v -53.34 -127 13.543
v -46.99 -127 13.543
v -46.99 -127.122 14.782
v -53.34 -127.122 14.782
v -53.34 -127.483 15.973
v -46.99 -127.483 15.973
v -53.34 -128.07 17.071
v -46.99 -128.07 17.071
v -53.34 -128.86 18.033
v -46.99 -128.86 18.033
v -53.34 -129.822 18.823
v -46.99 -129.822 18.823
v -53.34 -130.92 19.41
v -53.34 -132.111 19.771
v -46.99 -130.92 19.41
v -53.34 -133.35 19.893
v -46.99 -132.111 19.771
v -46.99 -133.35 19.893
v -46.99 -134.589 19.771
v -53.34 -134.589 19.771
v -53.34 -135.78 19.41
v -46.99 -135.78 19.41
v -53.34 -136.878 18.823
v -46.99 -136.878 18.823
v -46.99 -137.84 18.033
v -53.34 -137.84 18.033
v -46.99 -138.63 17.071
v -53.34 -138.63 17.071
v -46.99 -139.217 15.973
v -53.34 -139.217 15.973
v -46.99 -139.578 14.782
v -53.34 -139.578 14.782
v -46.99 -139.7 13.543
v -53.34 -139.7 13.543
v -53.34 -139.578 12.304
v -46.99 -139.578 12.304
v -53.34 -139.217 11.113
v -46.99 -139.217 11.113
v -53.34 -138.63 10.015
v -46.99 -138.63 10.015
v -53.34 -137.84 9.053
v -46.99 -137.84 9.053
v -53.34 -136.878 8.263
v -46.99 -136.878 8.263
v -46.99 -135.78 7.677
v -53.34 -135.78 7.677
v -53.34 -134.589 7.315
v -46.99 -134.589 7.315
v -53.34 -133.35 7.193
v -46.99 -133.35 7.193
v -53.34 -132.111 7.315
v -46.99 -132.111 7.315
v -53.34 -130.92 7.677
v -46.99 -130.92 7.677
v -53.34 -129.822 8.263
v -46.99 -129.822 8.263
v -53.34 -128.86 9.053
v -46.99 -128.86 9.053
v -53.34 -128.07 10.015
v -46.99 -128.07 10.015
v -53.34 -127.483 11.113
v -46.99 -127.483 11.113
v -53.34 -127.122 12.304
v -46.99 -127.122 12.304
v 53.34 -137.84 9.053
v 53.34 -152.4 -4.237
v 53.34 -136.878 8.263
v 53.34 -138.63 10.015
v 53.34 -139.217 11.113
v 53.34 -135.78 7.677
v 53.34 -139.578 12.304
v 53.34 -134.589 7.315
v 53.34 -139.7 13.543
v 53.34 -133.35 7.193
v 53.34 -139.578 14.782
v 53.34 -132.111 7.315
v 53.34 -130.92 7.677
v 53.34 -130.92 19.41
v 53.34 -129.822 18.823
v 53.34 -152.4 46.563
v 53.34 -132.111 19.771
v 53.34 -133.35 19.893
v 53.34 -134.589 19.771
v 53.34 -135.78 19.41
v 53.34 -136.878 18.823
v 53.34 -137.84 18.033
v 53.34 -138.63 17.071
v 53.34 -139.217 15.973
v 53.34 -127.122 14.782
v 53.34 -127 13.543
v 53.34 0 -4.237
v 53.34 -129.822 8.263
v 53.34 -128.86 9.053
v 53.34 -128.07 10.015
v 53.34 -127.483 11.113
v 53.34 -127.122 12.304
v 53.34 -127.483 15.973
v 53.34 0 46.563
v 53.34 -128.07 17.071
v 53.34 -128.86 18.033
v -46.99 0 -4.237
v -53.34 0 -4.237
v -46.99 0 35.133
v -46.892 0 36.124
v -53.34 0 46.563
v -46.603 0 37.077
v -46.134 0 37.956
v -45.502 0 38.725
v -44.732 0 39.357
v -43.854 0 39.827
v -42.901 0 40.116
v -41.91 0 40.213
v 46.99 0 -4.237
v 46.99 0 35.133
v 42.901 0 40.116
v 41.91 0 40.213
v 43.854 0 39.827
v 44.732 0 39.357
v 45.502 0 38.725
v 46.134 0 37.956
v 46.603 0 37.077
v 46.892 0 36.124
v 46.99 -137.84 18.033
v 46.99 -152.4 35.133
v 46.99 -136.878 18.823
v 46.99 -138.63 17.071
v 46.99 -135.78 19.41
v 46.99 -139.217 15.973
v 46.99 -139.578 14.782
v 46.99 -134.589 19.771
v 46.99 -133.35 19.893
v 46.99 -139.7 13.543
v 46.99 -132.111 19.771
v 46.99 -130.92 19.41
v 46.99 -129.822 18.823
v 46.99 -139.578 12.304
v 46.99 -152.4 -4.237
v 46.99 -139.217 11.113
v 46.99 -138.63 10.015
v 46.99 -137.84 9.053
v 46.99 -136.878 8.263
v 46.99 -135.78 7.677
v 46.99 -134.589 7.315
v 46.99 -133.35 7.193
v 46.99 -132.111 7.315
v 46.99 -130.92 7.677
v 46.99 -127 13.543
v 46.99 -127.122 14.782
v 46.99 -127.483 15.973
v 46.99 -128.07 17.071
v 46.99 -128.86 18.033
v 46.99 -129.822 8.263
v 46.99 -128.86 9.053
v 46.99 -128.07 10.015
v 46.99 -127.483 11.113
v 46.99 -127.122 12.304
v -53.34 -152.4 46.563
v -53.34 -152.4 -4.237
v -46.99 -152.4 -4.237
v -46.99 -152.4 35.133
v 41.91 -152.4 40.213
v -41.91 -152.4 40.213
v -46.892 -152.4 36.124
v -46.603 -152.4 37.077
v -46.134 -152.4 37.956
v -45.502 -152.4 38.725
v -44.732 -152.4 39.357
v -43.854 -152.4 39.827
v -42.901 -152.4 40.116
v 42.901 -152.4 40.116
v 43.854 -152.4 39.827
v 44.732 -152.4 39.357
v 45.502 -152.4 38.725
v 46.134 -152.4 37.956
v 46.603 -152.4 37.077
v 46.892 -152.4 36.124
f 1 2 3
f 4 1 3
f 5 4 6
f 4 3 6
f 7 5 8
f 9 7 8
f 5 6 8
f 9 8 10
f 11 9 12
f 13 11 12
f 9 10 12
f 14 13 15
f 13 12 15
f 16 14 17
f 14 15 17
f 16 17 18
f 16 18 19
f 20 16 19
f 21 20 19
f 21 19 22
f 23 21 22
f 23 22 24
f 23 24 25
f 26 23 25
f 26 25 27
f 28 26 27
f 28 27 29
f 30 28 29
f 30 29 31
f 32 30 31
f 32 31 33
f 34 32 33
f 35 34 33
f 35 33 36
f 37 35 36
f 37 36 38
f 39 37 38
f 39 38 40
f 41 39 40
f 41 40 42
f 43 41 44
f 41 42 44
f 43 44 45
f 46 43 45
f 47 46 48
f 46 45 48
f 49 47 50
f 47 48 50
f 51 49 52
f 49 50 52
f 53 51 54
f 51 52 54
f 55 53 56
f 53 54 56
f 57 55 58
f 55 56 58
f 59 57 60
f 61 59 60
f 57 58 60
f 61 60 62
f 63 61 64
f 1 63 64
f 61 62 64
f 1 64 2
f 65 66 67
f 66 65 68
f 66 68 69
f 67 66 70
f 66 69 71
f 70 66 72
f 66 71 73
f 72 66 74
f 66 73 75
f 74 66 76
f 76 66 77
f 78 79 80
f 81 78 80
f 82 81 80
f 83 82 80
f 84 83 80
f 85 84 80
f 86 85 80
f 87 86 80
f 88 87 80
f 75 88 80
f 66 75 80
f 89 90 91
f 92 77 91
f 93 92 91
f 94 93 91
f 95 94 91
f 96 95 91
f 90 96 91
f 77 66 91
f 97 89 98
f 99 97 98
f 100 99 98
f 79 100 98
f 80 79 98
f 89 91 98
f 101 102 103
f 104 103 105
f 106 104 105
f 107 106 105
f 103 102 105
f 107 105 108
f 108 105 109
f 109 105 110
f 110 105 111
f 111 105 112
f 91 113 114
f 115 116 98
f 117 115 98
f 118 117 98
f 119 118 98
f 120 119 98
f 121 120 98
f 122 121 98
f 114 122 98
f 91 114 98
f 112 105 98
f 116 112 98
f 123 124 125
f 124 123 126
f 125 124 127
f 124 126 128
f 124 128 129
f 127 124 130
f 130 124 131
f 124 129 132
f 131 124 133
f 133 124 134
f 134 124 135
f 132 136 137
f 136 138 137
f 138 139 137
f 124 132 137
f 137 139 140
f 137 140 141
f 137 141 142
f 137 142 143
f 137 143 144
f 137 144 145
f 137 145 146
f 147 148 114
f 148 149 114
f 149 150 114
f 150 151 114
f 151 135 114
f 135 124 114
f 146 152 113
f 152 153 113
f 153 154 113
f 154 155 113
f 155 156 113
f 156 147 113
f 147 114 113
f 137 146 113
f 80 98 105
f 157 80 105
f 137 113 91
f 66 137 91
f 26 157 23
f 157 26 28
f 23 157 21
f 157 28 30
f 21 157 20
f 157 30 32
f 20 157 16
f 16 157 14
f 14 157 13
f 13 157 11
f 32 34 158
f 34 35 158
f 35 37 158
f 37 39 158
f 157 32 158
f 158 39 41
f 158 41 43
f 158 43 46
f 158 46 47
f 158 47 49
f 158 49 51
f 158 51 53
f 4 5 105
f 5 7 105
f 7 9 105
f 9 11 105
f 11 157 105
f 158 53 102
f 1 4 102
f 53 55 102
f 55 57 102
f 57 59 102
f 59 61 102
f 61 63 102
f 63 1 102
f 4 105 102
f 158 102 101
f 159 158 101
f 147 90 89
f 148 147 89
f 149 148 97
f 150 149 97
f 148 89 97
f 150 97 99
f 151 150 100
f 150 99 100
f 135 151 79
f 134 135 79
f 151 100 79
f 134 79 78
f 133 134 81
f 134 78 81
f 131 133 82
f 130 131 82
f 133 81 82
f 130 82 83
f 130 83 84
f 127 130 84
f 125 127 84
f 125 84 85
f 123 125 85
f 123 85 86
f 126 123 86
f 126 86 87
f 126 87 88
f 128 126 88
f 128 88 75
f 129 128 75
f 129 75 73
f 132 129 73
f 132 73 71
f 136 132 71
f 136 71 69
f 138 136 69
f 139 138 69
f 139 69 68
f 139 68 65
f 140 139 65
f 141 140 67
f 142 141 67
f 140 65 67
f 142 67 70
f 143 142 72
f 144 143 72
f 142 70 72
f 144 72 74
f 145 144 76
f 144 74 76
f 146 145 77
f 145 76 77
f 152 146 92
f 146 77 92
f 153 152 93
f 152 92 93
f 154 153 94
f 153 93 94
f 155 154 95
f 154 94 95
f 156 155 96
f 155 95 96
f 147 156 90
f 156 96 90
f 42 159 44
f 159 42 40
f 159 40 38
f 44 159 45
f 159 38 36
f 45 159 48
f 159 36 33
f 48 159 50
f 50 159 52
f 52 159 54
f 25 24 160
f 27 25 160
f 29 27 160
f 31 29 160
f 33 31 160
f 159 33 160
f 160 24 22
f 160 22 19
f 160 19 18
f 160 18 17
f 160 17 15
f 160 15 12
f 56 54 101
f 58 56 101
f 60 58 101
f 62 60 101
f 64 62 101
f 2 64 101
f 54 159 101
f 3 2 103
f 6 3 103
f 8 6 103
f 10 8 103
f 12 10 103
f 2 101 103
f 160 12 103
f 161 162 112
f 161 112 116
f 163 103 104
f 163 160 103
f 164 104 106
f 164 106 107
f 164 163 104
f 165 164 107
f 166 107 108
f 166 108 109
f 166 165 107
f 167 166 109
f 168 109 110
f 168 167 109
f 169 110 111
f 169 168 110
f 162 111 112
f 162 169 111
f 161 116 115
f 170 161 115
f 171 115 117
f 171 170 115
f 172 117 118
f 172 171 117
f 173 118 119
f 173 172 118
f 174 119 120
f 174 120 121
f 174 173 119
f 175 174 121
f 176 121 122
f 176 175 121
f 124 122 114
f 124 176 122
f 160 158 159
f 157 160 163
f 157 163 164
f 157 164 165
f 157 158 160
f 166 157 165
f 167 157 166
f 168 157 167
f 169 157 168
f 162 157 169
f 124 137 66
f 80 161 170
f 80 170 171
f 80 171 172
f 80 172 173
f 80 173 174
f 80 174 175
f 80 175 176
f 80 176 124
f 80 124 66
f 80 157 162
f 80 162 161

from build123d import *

# Parameters (mm, degrees)
F1_DEPTH = 152.4
F2_R     = 5.08
F3_R     = 6.35
F4_DEPTH = 106.681


with BuildPart() as f1:
    # F0 (on Front) → F1 (new body)
    with BuildSketch(Plane.XZ):
        Polygon((-46.99, -4.236735), (-46.99, 40.213265), (46.99, 40.213265), (46.99, -4.236735), (53.34, -4.236735), (53.34, 46.563265), (-53.34, 46.563265), (-53.34, -4.236735), align=None)
    extrude(amount=F1_DEPTH)

    # F2
    f2_edges = [f1.edges().sort_by_distance(p)[0] for p in [
        (-46.99, -76.2, 40.213265),
        (46.99, -76.2, 40.213265),
    ]]
    fillet(f2_edges, radius=F2_R)

    # F3 (on face) → F4 (cut, through all)
    with BuildSketch(Plane.YZ.offset(53.34)):
        with Locations((-133.35, 13.543265)):
            Circle(F3_R)
    extrude(amount=-F4_DEPTH, mode=Mode.SUBTRACT)


solid = f1.part
